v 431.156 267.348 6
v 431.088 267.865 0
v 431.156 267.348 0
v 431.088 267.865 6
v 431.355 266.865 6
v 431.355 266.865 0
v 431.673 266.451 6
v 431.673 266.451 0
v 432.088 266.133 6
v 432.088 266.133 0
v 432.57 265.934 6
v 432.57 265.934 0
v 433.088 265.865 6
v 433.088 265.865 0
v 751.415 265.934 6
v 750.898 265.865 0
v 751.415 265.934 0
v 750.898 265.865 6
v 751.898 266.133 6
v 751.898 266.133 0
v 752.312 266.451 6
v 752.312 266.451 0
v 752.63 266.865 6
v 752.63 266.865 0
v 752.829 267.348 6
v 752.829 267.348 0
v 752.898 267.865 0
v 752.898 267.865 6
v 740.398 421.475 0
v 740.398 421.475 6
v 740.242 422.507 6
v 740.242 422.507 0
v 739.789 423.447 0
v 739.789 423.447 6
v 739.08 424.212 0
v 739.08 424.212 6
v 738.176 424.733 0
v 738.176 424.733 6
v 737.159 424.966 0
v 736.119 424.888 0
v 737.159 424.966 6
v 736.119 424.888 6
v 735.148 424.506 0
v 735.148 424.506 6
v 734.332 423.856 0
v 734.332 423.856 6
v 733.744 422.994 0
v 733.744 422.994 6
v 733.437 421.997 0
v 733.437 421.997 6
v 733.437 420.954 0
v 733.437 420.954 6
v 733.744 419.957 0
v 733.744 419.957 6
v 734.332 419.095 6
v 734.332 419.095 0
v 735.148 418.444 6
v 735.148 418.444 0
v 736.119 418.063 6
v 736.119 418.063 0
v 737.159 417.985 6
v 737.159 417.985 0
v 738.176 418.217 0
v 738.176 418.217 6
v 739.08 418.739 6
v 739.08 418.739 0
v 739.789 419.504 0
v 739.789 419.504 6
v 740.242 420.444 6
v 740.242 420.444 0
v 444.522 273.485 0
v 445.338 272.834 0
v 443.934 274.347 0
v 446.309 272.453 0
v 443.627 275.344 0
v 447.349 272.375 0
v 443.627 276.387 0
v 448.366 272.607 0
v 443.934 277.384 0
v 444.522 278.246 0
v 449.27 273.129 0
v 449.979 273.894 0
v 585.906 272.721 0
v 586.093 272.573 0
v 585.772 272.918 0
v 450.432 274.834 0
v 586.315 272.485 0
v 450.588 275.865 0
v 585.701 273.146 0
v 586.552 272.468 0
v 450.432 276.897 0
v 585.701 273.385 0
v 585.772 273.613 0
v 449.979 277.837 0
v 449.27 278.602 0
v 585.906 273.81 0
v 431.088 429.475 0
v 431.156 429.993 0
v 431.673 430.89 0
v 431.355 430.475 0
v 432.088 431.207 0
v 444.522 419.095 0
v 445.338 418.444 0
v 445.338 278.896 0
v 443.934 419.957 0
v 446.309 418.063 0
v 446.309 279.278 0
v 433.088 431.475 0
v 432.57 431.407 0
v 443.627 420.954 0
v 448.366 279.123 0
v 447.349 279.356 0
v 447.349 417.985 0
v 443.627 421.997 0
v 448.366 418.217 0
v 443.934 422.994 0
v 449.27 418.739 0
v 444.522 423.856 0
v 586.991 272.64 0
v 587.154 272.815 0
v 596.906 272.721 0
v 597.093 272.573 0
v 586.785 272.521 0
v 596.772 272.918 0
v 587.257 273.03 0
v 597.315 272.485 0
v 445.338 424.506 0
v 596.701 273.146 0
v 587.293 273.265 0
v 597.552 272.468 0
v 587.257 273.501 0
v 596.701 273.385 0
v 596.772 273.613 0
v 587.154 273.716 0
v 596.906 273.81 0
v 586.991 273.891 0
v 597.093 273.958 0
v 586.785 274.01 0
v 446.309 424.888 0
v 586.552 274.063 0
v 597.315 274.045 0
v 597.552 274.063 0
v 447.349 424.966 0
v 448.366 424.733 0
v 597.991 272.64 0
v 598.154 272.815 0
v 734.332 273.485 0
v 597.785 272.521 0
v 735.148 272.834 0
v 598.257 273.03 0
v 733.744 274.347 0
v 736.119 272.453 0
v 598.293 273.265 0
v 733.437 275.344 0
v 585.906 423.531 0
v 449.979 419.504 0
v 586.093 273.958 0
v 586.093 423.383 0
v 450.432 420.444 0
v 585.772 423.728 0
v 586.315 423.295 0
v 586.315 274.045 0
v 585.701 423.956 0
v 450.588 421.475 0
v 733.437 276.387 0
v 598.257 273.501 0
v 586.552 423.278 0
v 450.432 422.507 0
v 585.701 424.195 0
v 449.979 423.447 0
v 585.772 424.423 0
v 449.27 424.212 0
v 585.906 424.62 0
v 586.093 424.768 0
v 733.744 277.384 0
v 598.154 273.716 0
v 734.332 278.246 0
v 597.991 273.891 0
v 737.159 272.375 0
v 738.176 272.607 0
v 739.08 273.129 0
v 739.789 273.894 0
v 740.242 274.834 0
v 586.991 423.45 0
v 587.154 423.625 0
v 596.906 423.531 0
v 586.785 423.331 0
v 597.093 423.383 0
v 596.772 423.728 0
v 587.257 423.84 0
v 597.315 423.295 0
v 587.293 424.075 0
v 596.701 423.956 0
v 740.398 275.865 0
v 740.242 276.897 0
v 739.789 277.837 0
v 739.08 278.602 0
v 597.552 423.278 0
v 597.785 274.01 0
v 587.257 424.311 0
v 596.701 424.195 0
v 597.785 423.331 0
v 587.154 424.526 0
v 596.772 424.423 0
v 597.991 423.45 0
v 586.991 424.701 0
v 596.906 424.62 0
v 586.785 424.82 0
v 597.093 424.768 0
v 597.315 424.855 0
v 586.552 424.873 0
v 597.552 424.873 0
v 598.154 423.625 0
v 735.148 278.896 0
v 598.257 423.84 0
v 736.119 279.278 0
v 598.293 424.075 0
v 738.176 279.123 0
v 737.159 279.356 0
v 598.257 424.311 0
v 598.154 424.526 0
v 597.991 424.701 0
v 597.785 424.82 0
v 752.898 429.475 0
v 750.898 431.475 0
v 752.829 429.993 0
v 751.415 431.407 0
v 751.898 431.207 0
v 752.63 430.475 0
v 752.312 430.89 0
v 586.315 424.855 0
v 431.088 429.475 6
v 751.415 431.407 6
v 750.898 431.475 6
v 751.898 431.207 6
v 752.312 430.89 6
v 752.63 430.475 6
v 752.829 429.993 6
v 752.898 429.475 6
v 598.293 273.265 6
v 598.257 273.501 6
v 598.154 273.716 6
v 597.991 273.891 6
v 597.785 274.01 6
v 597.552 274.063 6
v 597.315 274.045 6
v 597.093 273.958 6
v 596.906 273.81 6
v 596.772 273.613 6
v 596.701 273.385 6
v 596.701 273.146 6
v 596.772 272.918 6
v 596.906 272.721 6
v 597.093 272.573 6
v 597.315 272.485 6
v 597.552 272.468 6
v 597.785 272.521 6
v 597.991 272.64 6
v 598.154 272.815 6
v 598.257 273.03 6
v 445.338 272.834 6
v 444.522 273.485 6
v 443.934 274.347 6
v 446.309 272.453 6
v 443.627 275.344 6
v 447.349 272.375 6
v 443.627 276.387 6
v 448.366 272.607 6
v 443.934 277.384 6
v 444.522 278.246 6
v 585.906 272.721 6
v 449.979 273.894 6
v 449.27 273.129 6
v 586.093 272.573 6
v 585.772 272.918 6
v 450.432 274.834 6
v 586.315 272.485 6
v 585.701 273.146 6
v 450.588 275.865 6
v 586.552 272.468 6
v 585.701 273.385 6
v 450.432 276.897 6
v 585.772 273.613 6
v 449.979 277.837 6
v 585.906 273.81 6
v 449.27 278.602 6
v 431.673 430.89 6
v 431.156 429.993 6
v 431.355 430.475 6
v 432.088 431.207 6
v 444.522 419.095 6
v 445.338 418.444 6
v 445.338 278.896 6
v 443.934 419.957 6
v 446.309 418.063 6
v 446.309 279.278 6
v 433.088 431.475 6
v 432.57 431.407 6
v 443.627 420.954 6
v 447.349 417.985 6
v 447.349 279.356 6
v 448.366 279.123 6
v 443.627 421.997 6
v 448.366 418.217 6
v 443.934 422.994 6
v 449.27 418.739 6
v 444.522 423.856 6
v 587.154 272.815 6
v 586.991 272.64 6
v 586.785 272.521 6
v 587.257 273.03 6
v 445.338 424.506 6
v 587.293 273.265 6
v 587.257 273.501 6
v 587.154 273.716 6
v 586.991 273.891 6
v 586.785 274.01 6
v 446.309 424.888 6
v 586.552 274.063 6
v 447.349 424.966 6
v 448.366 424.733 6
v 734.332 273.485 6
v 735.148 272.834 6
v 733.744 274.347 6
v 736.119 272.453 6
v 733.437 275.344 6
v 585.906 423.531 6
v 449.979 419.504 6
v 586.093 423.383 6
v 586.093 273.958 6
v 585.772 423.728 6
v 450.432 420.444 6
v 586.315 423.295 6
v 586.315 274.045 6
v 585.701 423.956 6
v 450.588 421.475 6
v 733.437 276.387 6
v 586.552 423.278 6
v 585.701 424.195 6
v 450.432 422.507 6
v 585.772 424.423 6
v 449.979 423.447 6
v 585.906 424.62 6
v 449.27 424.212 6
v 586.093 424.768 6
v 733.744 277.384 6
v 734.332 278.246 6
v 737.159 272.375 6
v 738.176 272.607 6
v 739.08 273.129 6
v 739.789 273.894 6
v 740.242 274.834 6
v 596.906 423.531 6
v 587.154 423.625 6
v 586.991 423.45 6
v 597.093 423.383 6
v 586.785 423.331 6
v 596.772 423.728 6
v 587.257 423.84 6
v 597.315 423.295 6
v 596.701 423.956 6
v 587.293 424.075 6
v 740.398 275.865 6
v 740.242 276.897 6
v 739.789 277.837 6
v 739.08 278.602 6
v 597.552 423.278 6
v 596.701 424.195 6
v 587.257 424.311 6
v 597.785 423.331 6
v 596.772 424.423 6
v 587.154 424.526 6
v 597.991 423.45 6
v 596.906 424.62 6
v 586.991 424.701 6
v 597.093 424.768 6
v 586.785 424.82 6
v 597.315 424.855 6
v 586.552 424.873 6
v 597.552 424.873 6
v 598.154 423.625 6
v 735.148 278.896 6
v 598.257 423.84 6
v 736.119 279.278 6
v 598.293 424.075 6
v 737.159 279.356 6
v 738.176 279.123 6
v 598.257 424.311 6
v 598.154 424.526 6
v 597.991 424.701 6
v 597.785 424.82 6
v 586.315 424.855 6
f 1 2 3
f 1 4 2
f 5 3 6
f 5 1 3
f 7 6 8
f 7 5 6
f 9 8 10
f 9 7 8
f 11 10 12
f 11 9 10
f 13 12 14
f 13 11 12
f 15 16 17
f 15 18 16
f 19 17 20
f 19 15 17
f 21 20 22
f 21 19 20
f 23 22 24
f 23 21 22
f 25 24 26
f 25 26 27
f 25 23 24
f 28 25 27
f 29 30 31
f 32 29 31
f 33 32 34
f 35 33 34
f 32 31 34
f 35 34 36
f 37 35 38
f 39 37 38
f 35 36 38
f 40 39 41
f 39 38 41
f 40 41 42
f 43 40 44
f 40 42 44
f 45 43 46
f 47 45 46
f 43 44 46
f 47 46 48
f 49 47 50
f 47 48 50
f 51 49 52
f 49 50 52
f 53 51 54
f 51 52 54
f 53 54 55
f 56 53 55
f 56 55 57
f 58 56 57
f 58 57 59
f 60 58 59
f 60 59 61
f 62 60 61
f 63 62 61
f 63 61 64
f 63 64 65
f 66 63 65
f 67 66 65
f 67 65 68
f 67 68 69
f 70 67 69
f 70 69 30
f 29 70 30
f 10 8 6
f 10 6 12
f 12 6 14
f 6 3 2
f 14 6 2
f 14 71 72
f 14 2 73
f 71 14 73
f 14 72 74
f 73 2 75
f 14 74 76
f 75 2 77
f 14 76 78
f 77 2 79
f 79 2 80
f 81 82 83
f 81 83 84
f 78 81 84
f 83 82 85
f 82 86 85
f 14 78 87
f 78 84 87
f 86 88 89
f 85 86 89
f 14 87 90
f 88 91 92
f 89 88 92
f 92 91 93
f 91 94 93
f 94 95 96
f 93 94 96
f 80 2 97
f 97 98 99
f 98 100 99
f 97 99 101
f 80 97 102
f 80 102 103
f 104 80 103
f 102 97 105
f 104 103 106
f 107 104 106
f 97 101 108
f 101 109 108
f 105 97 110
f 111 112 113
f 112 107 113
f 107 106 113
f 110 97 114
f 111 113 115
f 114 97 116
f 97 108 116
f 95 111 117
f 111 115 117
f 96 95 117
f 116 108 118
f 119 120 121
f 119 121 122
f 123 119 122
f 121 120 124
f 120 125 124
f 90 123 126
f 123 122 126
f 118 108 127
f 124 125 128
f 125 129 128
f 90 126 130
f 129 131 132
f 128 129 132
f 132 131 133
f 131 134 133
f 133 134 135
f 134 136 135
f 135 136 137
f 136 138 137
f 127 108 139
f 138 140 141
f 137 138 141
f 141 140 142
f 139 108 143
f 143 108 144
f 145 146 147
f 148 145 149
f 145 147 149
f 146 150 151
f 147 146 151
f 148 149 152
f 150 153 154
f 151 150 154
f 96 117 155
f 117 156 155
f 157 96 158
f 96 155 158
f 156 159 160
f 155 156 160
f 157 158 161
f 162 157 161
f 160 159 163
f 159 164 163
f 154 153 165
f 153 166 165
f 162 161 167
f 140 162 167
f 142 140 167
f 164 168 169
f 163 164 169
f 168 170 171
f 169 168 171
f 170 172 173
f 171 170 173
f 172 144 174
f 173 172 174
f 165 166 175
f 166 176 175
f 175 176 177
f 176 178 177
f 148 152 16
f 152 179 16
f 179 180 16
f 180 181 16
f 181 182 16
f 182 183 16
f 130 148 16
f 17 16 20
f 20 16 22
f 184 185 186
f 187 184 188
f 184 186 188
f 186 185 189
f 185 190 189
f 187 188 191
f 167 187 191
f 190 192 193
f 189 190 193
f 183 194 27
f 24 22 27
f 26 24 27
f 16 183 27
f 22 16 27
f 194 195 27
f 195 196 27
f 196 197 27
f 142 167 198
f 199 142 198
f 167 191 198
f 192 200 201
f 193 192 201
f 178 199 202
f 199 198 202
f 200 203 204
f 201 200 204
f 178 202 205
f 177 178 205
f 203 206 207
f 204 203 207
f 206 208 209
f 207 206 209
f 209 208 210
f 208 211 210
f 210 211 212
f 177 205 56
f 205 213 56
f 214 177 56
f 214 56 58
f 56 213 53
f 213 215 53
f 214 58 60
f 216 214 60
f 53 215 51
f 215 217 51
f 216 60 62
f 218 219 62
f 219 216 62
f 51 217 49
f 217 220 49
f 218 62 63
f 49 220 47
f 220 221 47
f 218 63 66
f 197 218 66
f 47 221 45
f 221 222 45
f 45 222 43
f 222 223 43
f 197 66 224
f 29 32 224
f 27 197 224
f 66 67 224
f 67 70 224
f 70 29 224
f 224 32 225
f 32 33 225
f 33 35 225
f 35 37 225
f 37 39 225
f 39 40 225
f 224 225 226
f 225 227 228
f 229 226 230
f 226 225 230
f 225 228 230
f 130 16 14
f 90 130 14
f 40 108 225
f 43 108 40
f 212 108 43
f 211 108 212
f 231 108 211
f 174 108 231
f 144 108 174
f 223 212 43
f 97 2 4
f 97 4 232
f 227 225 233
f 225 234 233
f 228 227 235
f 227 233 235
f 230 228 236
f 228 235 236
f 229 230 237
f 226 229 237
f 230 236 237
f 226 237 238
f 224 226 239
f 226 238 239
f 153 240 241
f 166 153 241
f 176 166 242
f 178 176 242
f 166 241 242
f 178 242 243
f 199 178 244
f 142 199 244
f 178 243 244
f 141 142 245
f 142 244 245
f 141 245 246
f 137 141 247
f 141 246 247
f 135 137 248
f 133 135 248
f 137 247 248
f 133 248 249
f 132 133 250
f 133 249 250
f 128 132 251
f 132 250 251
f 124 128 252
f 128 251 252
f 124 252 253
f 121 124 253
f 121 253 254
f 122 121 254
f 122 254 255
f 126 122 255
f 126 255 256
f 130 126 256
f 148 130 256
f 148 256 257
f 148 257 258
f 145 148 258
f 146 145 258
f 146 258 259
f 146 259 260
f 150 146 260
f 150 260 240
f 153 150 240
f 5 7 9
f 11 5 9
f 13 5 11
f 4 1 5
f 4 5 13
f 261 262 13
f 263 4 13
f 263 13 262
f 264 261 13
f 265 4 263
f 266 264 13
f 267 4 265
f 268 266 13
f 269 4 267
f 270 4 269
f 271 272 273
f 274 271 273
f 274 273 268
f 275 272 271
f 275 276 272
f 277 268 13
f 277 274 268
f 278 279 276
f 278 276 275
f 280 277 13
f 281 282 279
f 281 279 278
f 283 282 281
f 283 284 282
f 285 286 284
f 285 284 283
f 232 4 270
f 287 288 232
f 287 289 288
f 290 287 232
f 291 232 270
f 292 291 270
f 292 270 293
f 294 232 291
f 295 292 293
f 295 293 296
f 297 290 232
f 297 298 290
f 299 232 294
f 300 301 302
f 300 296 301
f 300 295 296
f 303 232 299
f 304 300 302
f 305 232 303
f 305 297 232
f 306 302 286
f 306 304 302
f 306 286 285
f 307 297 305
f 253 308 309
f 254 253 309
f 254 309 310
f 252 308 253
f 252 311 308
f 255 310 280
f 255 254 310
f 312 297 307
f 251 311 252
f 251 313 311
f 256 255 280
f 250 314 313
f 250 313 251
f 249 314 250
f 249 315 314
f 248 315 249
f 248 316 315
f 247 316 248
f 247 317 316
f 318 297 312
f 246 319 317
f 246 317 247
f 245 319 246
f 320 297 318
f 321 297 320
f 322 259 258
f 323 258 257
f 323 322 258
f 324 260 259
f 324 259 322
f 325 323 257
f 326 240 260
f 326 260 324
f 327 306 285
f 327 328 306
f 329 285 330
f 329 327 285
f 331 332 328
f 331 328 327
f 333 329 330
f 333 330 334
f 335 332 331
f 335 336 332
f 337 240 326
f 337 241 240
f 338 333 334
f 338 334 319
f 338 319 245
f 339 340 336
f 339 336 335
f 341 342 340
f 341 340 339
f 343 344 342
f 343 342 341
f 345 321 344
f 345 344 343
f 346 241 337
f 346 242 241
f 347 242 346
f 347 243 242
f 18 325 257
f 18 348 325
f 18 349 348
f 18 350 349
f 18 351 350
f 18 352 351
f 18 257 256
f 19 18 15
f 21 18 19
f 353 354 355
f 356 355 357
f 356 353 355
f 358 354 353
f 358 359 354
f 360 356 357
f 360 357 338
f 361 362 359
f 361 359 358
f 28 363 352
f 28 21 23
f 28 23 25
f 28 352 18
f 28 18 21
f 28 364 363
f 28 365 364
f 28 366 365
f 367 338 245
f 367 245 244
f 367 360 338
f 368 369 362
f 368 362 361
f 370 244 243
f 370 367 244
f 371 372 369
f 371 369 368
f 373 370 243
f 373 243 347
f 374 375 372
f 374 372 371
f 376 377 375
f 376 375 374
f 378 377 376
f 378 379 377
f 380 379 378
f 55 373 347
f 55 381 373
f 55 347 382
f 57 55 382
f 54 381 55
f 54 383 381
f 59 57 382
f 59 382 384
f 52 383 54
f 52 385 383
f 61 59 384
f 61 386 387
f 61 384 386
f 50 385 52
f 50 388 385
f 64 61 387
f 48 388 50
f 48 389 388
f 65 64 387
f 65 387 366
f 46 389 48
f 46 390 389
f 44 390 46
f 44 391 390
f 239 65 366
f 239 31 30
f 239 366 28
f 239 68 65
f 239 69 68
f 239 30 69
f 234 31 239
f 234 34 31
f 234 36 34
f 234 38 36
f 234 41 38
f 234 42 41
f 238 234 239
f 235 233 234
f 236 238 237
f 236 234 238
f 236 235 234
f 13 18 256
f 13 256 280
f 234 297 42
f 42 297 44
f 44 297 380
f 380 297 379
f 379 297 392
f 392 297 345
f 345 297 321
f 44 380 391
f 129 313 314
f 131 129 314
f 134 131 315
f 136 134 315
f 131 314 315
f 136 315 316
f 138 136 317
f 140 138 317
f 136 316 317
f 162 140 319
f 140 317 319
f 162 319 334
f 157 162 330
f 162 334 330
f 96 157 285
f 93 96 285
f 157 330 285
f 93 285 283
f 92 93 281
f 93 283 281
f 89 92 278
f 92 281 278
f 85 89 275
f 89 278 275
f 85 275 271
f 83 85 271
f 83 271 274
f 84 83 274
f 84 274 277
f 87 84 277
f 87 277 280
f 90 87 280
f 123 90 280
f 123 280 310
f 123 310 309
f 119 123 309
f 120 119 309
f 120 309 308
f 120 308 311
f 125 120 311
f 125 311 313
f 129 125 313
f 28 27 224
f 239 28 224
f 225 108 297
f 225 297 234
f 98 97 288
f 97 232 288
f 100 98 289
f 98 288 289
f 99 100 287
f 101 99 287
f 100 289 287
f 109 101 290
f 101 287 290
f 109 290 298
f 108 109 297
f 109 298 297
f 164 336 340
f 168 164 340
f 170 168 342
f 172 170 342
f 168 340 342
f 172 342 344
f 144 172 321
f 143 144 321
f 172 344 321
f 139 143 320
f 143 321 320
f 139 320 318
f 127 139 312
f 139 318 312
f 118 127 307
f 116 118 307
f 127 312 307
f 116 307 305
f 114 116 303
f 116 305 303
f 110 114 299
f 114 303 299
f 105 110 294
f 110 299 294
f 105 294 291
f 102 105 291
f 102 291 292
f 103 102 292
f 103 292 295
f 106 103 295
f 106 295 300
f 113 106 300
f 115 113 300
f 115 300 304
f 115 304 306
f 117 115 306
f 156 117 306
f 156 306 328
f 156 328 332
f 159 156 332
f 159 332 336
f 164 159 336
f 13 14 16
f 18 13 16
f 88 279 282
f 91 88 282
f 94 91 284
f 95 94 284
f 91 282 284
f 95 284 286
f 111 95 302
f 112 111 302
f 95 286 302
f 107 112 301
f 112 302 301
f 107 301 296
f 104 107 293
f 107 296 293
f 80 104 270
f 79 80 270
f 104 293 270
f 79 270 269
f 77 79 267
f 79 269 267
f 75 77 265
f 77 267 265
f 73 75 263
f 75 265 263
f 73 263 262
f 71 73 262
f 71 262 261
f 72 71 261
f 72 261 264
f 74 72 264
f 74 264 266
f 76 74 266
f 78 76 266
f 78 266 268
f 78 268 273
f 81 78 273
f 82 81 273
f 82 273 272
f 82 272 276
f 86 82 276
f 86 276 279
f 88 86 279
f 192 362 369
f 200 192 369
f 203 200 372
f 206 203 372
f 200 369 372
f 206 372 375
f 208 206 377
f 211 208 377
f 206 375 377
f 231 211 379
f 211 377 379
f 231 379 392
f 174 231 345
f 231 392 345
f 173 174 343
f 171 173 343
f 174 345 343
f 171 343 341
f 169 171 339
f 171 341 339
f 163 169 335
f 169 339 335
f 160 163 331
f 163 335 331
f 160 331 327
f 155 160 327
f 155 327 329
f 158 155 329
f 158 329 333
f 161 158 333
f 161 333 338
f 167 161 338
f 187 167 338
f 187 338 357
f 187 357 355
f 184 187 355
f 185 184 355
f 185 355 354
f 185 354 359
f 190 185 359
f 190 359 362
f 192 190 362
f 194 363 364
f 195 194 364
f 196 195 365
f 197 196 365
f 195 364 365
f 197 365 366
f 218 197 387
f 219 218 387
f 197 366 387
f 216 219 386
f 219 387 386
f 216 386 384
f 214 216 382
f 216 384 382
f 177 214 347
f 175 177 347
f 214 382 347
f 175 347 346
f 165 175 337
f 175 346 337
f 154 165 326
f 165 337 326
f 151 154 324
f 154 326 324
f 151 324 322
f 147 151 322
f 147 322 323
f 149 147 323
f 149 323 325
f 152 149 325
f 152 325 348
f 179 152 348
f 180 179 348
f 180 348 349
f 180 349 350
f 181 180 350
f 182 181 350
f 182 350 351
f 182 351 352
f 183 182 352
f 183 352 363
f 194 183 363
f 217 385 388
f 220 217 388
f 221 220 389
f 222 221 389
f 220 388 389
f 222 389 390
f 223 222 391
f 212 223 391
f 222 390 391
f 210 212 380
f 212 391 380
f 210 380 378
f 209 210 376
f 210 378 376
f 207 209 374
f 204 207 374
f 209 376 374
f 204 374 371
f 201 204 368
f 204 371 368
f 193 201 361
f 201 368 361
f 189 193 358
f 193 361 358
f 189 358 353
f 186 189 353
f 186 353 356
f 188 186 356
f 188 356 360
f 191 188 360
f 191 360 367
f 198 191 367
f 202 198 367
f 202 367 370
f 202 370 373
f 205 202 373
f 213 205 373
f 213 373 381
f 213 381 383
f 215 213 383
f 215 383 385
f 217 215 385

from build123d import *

# Parameters (mm, degrees)
SKETCH1_W           = 321.81
SKETCH1_H           = 165.61
BOSS_EXTRUDE1_DEPTH = 6
SKETCH3_R           = 3.5
CUT_EXTRUDE1_DEPTH  = 7
SKETCH6_R           = 0.8
CUT_EXTRUDE5_DEPTH  = 10
FILLET1_R           = 2


with BuildPart() as part:
    # Sketch1 → Boss-Extrude1 (new body)
    with BuildSketch(Plane.XY):
        with Locations((591.992540984, 348.670409836)):
            Rectangle(SKETCH1_W, SKETCH1_H)
    extrude(amount=BOSS_EXTRUDE1_DEPTH)

    # Sketch3 → Cut-Extrude1 (cut, through all)
    with BuildSketch(Plane.XY.offset(6)):
        with Locations((447.087540984, 421.475409836)):
            Circle(SKETCH3_R)
        with Locations((736.897540984, 421.475409836)):
            Circle(SKETCH3_R)
        with Locations((736.897540984, 275.865409836)):
            Circle(SKETCH3_R)
        with Locations((447.087540984, 275.865409836)):
            Circle(SKETCH3_R)
    extrude(amount=-CUT_EXTRUDE1_DEPTH, mode=Mode.SUBTRACT)

    # Sketch6 → Cut-Extrude5 (cut)
    with BuildSketch(Plane.XY.offset(6)):
        with Locations((586.492540984, 424.075409836)):
            Circle(SKETCH6_R)
        with Locations((597.492540984, 424.075409836)):
            Circle(SKETCH6_R)
        with Locations((586.492540984, 273.265409836)):
            Circle(SKETCH6_R)
        with Locations((597.492540984, 273.265409836)):
            Circle(SKETCH6_R)
    extrude(amount=-CUT_EXTRUDE5_DEPTH, mode=Mode.SUBTRACT)

    # Fillet1
    fillet1_edges = [part.edges().sort_by_distance(p)[0] for p in [
        (431.087540984, 431.475409836, 3),
        (752.897540984, 431.475409836, 3),
        (752.897540984, 265.865409836, 3),
        (431.087540984, 265.865409836, 3),
    ]]
    fillet(fillet1_edges, radius=FILLET1_R)


solid = part.part
